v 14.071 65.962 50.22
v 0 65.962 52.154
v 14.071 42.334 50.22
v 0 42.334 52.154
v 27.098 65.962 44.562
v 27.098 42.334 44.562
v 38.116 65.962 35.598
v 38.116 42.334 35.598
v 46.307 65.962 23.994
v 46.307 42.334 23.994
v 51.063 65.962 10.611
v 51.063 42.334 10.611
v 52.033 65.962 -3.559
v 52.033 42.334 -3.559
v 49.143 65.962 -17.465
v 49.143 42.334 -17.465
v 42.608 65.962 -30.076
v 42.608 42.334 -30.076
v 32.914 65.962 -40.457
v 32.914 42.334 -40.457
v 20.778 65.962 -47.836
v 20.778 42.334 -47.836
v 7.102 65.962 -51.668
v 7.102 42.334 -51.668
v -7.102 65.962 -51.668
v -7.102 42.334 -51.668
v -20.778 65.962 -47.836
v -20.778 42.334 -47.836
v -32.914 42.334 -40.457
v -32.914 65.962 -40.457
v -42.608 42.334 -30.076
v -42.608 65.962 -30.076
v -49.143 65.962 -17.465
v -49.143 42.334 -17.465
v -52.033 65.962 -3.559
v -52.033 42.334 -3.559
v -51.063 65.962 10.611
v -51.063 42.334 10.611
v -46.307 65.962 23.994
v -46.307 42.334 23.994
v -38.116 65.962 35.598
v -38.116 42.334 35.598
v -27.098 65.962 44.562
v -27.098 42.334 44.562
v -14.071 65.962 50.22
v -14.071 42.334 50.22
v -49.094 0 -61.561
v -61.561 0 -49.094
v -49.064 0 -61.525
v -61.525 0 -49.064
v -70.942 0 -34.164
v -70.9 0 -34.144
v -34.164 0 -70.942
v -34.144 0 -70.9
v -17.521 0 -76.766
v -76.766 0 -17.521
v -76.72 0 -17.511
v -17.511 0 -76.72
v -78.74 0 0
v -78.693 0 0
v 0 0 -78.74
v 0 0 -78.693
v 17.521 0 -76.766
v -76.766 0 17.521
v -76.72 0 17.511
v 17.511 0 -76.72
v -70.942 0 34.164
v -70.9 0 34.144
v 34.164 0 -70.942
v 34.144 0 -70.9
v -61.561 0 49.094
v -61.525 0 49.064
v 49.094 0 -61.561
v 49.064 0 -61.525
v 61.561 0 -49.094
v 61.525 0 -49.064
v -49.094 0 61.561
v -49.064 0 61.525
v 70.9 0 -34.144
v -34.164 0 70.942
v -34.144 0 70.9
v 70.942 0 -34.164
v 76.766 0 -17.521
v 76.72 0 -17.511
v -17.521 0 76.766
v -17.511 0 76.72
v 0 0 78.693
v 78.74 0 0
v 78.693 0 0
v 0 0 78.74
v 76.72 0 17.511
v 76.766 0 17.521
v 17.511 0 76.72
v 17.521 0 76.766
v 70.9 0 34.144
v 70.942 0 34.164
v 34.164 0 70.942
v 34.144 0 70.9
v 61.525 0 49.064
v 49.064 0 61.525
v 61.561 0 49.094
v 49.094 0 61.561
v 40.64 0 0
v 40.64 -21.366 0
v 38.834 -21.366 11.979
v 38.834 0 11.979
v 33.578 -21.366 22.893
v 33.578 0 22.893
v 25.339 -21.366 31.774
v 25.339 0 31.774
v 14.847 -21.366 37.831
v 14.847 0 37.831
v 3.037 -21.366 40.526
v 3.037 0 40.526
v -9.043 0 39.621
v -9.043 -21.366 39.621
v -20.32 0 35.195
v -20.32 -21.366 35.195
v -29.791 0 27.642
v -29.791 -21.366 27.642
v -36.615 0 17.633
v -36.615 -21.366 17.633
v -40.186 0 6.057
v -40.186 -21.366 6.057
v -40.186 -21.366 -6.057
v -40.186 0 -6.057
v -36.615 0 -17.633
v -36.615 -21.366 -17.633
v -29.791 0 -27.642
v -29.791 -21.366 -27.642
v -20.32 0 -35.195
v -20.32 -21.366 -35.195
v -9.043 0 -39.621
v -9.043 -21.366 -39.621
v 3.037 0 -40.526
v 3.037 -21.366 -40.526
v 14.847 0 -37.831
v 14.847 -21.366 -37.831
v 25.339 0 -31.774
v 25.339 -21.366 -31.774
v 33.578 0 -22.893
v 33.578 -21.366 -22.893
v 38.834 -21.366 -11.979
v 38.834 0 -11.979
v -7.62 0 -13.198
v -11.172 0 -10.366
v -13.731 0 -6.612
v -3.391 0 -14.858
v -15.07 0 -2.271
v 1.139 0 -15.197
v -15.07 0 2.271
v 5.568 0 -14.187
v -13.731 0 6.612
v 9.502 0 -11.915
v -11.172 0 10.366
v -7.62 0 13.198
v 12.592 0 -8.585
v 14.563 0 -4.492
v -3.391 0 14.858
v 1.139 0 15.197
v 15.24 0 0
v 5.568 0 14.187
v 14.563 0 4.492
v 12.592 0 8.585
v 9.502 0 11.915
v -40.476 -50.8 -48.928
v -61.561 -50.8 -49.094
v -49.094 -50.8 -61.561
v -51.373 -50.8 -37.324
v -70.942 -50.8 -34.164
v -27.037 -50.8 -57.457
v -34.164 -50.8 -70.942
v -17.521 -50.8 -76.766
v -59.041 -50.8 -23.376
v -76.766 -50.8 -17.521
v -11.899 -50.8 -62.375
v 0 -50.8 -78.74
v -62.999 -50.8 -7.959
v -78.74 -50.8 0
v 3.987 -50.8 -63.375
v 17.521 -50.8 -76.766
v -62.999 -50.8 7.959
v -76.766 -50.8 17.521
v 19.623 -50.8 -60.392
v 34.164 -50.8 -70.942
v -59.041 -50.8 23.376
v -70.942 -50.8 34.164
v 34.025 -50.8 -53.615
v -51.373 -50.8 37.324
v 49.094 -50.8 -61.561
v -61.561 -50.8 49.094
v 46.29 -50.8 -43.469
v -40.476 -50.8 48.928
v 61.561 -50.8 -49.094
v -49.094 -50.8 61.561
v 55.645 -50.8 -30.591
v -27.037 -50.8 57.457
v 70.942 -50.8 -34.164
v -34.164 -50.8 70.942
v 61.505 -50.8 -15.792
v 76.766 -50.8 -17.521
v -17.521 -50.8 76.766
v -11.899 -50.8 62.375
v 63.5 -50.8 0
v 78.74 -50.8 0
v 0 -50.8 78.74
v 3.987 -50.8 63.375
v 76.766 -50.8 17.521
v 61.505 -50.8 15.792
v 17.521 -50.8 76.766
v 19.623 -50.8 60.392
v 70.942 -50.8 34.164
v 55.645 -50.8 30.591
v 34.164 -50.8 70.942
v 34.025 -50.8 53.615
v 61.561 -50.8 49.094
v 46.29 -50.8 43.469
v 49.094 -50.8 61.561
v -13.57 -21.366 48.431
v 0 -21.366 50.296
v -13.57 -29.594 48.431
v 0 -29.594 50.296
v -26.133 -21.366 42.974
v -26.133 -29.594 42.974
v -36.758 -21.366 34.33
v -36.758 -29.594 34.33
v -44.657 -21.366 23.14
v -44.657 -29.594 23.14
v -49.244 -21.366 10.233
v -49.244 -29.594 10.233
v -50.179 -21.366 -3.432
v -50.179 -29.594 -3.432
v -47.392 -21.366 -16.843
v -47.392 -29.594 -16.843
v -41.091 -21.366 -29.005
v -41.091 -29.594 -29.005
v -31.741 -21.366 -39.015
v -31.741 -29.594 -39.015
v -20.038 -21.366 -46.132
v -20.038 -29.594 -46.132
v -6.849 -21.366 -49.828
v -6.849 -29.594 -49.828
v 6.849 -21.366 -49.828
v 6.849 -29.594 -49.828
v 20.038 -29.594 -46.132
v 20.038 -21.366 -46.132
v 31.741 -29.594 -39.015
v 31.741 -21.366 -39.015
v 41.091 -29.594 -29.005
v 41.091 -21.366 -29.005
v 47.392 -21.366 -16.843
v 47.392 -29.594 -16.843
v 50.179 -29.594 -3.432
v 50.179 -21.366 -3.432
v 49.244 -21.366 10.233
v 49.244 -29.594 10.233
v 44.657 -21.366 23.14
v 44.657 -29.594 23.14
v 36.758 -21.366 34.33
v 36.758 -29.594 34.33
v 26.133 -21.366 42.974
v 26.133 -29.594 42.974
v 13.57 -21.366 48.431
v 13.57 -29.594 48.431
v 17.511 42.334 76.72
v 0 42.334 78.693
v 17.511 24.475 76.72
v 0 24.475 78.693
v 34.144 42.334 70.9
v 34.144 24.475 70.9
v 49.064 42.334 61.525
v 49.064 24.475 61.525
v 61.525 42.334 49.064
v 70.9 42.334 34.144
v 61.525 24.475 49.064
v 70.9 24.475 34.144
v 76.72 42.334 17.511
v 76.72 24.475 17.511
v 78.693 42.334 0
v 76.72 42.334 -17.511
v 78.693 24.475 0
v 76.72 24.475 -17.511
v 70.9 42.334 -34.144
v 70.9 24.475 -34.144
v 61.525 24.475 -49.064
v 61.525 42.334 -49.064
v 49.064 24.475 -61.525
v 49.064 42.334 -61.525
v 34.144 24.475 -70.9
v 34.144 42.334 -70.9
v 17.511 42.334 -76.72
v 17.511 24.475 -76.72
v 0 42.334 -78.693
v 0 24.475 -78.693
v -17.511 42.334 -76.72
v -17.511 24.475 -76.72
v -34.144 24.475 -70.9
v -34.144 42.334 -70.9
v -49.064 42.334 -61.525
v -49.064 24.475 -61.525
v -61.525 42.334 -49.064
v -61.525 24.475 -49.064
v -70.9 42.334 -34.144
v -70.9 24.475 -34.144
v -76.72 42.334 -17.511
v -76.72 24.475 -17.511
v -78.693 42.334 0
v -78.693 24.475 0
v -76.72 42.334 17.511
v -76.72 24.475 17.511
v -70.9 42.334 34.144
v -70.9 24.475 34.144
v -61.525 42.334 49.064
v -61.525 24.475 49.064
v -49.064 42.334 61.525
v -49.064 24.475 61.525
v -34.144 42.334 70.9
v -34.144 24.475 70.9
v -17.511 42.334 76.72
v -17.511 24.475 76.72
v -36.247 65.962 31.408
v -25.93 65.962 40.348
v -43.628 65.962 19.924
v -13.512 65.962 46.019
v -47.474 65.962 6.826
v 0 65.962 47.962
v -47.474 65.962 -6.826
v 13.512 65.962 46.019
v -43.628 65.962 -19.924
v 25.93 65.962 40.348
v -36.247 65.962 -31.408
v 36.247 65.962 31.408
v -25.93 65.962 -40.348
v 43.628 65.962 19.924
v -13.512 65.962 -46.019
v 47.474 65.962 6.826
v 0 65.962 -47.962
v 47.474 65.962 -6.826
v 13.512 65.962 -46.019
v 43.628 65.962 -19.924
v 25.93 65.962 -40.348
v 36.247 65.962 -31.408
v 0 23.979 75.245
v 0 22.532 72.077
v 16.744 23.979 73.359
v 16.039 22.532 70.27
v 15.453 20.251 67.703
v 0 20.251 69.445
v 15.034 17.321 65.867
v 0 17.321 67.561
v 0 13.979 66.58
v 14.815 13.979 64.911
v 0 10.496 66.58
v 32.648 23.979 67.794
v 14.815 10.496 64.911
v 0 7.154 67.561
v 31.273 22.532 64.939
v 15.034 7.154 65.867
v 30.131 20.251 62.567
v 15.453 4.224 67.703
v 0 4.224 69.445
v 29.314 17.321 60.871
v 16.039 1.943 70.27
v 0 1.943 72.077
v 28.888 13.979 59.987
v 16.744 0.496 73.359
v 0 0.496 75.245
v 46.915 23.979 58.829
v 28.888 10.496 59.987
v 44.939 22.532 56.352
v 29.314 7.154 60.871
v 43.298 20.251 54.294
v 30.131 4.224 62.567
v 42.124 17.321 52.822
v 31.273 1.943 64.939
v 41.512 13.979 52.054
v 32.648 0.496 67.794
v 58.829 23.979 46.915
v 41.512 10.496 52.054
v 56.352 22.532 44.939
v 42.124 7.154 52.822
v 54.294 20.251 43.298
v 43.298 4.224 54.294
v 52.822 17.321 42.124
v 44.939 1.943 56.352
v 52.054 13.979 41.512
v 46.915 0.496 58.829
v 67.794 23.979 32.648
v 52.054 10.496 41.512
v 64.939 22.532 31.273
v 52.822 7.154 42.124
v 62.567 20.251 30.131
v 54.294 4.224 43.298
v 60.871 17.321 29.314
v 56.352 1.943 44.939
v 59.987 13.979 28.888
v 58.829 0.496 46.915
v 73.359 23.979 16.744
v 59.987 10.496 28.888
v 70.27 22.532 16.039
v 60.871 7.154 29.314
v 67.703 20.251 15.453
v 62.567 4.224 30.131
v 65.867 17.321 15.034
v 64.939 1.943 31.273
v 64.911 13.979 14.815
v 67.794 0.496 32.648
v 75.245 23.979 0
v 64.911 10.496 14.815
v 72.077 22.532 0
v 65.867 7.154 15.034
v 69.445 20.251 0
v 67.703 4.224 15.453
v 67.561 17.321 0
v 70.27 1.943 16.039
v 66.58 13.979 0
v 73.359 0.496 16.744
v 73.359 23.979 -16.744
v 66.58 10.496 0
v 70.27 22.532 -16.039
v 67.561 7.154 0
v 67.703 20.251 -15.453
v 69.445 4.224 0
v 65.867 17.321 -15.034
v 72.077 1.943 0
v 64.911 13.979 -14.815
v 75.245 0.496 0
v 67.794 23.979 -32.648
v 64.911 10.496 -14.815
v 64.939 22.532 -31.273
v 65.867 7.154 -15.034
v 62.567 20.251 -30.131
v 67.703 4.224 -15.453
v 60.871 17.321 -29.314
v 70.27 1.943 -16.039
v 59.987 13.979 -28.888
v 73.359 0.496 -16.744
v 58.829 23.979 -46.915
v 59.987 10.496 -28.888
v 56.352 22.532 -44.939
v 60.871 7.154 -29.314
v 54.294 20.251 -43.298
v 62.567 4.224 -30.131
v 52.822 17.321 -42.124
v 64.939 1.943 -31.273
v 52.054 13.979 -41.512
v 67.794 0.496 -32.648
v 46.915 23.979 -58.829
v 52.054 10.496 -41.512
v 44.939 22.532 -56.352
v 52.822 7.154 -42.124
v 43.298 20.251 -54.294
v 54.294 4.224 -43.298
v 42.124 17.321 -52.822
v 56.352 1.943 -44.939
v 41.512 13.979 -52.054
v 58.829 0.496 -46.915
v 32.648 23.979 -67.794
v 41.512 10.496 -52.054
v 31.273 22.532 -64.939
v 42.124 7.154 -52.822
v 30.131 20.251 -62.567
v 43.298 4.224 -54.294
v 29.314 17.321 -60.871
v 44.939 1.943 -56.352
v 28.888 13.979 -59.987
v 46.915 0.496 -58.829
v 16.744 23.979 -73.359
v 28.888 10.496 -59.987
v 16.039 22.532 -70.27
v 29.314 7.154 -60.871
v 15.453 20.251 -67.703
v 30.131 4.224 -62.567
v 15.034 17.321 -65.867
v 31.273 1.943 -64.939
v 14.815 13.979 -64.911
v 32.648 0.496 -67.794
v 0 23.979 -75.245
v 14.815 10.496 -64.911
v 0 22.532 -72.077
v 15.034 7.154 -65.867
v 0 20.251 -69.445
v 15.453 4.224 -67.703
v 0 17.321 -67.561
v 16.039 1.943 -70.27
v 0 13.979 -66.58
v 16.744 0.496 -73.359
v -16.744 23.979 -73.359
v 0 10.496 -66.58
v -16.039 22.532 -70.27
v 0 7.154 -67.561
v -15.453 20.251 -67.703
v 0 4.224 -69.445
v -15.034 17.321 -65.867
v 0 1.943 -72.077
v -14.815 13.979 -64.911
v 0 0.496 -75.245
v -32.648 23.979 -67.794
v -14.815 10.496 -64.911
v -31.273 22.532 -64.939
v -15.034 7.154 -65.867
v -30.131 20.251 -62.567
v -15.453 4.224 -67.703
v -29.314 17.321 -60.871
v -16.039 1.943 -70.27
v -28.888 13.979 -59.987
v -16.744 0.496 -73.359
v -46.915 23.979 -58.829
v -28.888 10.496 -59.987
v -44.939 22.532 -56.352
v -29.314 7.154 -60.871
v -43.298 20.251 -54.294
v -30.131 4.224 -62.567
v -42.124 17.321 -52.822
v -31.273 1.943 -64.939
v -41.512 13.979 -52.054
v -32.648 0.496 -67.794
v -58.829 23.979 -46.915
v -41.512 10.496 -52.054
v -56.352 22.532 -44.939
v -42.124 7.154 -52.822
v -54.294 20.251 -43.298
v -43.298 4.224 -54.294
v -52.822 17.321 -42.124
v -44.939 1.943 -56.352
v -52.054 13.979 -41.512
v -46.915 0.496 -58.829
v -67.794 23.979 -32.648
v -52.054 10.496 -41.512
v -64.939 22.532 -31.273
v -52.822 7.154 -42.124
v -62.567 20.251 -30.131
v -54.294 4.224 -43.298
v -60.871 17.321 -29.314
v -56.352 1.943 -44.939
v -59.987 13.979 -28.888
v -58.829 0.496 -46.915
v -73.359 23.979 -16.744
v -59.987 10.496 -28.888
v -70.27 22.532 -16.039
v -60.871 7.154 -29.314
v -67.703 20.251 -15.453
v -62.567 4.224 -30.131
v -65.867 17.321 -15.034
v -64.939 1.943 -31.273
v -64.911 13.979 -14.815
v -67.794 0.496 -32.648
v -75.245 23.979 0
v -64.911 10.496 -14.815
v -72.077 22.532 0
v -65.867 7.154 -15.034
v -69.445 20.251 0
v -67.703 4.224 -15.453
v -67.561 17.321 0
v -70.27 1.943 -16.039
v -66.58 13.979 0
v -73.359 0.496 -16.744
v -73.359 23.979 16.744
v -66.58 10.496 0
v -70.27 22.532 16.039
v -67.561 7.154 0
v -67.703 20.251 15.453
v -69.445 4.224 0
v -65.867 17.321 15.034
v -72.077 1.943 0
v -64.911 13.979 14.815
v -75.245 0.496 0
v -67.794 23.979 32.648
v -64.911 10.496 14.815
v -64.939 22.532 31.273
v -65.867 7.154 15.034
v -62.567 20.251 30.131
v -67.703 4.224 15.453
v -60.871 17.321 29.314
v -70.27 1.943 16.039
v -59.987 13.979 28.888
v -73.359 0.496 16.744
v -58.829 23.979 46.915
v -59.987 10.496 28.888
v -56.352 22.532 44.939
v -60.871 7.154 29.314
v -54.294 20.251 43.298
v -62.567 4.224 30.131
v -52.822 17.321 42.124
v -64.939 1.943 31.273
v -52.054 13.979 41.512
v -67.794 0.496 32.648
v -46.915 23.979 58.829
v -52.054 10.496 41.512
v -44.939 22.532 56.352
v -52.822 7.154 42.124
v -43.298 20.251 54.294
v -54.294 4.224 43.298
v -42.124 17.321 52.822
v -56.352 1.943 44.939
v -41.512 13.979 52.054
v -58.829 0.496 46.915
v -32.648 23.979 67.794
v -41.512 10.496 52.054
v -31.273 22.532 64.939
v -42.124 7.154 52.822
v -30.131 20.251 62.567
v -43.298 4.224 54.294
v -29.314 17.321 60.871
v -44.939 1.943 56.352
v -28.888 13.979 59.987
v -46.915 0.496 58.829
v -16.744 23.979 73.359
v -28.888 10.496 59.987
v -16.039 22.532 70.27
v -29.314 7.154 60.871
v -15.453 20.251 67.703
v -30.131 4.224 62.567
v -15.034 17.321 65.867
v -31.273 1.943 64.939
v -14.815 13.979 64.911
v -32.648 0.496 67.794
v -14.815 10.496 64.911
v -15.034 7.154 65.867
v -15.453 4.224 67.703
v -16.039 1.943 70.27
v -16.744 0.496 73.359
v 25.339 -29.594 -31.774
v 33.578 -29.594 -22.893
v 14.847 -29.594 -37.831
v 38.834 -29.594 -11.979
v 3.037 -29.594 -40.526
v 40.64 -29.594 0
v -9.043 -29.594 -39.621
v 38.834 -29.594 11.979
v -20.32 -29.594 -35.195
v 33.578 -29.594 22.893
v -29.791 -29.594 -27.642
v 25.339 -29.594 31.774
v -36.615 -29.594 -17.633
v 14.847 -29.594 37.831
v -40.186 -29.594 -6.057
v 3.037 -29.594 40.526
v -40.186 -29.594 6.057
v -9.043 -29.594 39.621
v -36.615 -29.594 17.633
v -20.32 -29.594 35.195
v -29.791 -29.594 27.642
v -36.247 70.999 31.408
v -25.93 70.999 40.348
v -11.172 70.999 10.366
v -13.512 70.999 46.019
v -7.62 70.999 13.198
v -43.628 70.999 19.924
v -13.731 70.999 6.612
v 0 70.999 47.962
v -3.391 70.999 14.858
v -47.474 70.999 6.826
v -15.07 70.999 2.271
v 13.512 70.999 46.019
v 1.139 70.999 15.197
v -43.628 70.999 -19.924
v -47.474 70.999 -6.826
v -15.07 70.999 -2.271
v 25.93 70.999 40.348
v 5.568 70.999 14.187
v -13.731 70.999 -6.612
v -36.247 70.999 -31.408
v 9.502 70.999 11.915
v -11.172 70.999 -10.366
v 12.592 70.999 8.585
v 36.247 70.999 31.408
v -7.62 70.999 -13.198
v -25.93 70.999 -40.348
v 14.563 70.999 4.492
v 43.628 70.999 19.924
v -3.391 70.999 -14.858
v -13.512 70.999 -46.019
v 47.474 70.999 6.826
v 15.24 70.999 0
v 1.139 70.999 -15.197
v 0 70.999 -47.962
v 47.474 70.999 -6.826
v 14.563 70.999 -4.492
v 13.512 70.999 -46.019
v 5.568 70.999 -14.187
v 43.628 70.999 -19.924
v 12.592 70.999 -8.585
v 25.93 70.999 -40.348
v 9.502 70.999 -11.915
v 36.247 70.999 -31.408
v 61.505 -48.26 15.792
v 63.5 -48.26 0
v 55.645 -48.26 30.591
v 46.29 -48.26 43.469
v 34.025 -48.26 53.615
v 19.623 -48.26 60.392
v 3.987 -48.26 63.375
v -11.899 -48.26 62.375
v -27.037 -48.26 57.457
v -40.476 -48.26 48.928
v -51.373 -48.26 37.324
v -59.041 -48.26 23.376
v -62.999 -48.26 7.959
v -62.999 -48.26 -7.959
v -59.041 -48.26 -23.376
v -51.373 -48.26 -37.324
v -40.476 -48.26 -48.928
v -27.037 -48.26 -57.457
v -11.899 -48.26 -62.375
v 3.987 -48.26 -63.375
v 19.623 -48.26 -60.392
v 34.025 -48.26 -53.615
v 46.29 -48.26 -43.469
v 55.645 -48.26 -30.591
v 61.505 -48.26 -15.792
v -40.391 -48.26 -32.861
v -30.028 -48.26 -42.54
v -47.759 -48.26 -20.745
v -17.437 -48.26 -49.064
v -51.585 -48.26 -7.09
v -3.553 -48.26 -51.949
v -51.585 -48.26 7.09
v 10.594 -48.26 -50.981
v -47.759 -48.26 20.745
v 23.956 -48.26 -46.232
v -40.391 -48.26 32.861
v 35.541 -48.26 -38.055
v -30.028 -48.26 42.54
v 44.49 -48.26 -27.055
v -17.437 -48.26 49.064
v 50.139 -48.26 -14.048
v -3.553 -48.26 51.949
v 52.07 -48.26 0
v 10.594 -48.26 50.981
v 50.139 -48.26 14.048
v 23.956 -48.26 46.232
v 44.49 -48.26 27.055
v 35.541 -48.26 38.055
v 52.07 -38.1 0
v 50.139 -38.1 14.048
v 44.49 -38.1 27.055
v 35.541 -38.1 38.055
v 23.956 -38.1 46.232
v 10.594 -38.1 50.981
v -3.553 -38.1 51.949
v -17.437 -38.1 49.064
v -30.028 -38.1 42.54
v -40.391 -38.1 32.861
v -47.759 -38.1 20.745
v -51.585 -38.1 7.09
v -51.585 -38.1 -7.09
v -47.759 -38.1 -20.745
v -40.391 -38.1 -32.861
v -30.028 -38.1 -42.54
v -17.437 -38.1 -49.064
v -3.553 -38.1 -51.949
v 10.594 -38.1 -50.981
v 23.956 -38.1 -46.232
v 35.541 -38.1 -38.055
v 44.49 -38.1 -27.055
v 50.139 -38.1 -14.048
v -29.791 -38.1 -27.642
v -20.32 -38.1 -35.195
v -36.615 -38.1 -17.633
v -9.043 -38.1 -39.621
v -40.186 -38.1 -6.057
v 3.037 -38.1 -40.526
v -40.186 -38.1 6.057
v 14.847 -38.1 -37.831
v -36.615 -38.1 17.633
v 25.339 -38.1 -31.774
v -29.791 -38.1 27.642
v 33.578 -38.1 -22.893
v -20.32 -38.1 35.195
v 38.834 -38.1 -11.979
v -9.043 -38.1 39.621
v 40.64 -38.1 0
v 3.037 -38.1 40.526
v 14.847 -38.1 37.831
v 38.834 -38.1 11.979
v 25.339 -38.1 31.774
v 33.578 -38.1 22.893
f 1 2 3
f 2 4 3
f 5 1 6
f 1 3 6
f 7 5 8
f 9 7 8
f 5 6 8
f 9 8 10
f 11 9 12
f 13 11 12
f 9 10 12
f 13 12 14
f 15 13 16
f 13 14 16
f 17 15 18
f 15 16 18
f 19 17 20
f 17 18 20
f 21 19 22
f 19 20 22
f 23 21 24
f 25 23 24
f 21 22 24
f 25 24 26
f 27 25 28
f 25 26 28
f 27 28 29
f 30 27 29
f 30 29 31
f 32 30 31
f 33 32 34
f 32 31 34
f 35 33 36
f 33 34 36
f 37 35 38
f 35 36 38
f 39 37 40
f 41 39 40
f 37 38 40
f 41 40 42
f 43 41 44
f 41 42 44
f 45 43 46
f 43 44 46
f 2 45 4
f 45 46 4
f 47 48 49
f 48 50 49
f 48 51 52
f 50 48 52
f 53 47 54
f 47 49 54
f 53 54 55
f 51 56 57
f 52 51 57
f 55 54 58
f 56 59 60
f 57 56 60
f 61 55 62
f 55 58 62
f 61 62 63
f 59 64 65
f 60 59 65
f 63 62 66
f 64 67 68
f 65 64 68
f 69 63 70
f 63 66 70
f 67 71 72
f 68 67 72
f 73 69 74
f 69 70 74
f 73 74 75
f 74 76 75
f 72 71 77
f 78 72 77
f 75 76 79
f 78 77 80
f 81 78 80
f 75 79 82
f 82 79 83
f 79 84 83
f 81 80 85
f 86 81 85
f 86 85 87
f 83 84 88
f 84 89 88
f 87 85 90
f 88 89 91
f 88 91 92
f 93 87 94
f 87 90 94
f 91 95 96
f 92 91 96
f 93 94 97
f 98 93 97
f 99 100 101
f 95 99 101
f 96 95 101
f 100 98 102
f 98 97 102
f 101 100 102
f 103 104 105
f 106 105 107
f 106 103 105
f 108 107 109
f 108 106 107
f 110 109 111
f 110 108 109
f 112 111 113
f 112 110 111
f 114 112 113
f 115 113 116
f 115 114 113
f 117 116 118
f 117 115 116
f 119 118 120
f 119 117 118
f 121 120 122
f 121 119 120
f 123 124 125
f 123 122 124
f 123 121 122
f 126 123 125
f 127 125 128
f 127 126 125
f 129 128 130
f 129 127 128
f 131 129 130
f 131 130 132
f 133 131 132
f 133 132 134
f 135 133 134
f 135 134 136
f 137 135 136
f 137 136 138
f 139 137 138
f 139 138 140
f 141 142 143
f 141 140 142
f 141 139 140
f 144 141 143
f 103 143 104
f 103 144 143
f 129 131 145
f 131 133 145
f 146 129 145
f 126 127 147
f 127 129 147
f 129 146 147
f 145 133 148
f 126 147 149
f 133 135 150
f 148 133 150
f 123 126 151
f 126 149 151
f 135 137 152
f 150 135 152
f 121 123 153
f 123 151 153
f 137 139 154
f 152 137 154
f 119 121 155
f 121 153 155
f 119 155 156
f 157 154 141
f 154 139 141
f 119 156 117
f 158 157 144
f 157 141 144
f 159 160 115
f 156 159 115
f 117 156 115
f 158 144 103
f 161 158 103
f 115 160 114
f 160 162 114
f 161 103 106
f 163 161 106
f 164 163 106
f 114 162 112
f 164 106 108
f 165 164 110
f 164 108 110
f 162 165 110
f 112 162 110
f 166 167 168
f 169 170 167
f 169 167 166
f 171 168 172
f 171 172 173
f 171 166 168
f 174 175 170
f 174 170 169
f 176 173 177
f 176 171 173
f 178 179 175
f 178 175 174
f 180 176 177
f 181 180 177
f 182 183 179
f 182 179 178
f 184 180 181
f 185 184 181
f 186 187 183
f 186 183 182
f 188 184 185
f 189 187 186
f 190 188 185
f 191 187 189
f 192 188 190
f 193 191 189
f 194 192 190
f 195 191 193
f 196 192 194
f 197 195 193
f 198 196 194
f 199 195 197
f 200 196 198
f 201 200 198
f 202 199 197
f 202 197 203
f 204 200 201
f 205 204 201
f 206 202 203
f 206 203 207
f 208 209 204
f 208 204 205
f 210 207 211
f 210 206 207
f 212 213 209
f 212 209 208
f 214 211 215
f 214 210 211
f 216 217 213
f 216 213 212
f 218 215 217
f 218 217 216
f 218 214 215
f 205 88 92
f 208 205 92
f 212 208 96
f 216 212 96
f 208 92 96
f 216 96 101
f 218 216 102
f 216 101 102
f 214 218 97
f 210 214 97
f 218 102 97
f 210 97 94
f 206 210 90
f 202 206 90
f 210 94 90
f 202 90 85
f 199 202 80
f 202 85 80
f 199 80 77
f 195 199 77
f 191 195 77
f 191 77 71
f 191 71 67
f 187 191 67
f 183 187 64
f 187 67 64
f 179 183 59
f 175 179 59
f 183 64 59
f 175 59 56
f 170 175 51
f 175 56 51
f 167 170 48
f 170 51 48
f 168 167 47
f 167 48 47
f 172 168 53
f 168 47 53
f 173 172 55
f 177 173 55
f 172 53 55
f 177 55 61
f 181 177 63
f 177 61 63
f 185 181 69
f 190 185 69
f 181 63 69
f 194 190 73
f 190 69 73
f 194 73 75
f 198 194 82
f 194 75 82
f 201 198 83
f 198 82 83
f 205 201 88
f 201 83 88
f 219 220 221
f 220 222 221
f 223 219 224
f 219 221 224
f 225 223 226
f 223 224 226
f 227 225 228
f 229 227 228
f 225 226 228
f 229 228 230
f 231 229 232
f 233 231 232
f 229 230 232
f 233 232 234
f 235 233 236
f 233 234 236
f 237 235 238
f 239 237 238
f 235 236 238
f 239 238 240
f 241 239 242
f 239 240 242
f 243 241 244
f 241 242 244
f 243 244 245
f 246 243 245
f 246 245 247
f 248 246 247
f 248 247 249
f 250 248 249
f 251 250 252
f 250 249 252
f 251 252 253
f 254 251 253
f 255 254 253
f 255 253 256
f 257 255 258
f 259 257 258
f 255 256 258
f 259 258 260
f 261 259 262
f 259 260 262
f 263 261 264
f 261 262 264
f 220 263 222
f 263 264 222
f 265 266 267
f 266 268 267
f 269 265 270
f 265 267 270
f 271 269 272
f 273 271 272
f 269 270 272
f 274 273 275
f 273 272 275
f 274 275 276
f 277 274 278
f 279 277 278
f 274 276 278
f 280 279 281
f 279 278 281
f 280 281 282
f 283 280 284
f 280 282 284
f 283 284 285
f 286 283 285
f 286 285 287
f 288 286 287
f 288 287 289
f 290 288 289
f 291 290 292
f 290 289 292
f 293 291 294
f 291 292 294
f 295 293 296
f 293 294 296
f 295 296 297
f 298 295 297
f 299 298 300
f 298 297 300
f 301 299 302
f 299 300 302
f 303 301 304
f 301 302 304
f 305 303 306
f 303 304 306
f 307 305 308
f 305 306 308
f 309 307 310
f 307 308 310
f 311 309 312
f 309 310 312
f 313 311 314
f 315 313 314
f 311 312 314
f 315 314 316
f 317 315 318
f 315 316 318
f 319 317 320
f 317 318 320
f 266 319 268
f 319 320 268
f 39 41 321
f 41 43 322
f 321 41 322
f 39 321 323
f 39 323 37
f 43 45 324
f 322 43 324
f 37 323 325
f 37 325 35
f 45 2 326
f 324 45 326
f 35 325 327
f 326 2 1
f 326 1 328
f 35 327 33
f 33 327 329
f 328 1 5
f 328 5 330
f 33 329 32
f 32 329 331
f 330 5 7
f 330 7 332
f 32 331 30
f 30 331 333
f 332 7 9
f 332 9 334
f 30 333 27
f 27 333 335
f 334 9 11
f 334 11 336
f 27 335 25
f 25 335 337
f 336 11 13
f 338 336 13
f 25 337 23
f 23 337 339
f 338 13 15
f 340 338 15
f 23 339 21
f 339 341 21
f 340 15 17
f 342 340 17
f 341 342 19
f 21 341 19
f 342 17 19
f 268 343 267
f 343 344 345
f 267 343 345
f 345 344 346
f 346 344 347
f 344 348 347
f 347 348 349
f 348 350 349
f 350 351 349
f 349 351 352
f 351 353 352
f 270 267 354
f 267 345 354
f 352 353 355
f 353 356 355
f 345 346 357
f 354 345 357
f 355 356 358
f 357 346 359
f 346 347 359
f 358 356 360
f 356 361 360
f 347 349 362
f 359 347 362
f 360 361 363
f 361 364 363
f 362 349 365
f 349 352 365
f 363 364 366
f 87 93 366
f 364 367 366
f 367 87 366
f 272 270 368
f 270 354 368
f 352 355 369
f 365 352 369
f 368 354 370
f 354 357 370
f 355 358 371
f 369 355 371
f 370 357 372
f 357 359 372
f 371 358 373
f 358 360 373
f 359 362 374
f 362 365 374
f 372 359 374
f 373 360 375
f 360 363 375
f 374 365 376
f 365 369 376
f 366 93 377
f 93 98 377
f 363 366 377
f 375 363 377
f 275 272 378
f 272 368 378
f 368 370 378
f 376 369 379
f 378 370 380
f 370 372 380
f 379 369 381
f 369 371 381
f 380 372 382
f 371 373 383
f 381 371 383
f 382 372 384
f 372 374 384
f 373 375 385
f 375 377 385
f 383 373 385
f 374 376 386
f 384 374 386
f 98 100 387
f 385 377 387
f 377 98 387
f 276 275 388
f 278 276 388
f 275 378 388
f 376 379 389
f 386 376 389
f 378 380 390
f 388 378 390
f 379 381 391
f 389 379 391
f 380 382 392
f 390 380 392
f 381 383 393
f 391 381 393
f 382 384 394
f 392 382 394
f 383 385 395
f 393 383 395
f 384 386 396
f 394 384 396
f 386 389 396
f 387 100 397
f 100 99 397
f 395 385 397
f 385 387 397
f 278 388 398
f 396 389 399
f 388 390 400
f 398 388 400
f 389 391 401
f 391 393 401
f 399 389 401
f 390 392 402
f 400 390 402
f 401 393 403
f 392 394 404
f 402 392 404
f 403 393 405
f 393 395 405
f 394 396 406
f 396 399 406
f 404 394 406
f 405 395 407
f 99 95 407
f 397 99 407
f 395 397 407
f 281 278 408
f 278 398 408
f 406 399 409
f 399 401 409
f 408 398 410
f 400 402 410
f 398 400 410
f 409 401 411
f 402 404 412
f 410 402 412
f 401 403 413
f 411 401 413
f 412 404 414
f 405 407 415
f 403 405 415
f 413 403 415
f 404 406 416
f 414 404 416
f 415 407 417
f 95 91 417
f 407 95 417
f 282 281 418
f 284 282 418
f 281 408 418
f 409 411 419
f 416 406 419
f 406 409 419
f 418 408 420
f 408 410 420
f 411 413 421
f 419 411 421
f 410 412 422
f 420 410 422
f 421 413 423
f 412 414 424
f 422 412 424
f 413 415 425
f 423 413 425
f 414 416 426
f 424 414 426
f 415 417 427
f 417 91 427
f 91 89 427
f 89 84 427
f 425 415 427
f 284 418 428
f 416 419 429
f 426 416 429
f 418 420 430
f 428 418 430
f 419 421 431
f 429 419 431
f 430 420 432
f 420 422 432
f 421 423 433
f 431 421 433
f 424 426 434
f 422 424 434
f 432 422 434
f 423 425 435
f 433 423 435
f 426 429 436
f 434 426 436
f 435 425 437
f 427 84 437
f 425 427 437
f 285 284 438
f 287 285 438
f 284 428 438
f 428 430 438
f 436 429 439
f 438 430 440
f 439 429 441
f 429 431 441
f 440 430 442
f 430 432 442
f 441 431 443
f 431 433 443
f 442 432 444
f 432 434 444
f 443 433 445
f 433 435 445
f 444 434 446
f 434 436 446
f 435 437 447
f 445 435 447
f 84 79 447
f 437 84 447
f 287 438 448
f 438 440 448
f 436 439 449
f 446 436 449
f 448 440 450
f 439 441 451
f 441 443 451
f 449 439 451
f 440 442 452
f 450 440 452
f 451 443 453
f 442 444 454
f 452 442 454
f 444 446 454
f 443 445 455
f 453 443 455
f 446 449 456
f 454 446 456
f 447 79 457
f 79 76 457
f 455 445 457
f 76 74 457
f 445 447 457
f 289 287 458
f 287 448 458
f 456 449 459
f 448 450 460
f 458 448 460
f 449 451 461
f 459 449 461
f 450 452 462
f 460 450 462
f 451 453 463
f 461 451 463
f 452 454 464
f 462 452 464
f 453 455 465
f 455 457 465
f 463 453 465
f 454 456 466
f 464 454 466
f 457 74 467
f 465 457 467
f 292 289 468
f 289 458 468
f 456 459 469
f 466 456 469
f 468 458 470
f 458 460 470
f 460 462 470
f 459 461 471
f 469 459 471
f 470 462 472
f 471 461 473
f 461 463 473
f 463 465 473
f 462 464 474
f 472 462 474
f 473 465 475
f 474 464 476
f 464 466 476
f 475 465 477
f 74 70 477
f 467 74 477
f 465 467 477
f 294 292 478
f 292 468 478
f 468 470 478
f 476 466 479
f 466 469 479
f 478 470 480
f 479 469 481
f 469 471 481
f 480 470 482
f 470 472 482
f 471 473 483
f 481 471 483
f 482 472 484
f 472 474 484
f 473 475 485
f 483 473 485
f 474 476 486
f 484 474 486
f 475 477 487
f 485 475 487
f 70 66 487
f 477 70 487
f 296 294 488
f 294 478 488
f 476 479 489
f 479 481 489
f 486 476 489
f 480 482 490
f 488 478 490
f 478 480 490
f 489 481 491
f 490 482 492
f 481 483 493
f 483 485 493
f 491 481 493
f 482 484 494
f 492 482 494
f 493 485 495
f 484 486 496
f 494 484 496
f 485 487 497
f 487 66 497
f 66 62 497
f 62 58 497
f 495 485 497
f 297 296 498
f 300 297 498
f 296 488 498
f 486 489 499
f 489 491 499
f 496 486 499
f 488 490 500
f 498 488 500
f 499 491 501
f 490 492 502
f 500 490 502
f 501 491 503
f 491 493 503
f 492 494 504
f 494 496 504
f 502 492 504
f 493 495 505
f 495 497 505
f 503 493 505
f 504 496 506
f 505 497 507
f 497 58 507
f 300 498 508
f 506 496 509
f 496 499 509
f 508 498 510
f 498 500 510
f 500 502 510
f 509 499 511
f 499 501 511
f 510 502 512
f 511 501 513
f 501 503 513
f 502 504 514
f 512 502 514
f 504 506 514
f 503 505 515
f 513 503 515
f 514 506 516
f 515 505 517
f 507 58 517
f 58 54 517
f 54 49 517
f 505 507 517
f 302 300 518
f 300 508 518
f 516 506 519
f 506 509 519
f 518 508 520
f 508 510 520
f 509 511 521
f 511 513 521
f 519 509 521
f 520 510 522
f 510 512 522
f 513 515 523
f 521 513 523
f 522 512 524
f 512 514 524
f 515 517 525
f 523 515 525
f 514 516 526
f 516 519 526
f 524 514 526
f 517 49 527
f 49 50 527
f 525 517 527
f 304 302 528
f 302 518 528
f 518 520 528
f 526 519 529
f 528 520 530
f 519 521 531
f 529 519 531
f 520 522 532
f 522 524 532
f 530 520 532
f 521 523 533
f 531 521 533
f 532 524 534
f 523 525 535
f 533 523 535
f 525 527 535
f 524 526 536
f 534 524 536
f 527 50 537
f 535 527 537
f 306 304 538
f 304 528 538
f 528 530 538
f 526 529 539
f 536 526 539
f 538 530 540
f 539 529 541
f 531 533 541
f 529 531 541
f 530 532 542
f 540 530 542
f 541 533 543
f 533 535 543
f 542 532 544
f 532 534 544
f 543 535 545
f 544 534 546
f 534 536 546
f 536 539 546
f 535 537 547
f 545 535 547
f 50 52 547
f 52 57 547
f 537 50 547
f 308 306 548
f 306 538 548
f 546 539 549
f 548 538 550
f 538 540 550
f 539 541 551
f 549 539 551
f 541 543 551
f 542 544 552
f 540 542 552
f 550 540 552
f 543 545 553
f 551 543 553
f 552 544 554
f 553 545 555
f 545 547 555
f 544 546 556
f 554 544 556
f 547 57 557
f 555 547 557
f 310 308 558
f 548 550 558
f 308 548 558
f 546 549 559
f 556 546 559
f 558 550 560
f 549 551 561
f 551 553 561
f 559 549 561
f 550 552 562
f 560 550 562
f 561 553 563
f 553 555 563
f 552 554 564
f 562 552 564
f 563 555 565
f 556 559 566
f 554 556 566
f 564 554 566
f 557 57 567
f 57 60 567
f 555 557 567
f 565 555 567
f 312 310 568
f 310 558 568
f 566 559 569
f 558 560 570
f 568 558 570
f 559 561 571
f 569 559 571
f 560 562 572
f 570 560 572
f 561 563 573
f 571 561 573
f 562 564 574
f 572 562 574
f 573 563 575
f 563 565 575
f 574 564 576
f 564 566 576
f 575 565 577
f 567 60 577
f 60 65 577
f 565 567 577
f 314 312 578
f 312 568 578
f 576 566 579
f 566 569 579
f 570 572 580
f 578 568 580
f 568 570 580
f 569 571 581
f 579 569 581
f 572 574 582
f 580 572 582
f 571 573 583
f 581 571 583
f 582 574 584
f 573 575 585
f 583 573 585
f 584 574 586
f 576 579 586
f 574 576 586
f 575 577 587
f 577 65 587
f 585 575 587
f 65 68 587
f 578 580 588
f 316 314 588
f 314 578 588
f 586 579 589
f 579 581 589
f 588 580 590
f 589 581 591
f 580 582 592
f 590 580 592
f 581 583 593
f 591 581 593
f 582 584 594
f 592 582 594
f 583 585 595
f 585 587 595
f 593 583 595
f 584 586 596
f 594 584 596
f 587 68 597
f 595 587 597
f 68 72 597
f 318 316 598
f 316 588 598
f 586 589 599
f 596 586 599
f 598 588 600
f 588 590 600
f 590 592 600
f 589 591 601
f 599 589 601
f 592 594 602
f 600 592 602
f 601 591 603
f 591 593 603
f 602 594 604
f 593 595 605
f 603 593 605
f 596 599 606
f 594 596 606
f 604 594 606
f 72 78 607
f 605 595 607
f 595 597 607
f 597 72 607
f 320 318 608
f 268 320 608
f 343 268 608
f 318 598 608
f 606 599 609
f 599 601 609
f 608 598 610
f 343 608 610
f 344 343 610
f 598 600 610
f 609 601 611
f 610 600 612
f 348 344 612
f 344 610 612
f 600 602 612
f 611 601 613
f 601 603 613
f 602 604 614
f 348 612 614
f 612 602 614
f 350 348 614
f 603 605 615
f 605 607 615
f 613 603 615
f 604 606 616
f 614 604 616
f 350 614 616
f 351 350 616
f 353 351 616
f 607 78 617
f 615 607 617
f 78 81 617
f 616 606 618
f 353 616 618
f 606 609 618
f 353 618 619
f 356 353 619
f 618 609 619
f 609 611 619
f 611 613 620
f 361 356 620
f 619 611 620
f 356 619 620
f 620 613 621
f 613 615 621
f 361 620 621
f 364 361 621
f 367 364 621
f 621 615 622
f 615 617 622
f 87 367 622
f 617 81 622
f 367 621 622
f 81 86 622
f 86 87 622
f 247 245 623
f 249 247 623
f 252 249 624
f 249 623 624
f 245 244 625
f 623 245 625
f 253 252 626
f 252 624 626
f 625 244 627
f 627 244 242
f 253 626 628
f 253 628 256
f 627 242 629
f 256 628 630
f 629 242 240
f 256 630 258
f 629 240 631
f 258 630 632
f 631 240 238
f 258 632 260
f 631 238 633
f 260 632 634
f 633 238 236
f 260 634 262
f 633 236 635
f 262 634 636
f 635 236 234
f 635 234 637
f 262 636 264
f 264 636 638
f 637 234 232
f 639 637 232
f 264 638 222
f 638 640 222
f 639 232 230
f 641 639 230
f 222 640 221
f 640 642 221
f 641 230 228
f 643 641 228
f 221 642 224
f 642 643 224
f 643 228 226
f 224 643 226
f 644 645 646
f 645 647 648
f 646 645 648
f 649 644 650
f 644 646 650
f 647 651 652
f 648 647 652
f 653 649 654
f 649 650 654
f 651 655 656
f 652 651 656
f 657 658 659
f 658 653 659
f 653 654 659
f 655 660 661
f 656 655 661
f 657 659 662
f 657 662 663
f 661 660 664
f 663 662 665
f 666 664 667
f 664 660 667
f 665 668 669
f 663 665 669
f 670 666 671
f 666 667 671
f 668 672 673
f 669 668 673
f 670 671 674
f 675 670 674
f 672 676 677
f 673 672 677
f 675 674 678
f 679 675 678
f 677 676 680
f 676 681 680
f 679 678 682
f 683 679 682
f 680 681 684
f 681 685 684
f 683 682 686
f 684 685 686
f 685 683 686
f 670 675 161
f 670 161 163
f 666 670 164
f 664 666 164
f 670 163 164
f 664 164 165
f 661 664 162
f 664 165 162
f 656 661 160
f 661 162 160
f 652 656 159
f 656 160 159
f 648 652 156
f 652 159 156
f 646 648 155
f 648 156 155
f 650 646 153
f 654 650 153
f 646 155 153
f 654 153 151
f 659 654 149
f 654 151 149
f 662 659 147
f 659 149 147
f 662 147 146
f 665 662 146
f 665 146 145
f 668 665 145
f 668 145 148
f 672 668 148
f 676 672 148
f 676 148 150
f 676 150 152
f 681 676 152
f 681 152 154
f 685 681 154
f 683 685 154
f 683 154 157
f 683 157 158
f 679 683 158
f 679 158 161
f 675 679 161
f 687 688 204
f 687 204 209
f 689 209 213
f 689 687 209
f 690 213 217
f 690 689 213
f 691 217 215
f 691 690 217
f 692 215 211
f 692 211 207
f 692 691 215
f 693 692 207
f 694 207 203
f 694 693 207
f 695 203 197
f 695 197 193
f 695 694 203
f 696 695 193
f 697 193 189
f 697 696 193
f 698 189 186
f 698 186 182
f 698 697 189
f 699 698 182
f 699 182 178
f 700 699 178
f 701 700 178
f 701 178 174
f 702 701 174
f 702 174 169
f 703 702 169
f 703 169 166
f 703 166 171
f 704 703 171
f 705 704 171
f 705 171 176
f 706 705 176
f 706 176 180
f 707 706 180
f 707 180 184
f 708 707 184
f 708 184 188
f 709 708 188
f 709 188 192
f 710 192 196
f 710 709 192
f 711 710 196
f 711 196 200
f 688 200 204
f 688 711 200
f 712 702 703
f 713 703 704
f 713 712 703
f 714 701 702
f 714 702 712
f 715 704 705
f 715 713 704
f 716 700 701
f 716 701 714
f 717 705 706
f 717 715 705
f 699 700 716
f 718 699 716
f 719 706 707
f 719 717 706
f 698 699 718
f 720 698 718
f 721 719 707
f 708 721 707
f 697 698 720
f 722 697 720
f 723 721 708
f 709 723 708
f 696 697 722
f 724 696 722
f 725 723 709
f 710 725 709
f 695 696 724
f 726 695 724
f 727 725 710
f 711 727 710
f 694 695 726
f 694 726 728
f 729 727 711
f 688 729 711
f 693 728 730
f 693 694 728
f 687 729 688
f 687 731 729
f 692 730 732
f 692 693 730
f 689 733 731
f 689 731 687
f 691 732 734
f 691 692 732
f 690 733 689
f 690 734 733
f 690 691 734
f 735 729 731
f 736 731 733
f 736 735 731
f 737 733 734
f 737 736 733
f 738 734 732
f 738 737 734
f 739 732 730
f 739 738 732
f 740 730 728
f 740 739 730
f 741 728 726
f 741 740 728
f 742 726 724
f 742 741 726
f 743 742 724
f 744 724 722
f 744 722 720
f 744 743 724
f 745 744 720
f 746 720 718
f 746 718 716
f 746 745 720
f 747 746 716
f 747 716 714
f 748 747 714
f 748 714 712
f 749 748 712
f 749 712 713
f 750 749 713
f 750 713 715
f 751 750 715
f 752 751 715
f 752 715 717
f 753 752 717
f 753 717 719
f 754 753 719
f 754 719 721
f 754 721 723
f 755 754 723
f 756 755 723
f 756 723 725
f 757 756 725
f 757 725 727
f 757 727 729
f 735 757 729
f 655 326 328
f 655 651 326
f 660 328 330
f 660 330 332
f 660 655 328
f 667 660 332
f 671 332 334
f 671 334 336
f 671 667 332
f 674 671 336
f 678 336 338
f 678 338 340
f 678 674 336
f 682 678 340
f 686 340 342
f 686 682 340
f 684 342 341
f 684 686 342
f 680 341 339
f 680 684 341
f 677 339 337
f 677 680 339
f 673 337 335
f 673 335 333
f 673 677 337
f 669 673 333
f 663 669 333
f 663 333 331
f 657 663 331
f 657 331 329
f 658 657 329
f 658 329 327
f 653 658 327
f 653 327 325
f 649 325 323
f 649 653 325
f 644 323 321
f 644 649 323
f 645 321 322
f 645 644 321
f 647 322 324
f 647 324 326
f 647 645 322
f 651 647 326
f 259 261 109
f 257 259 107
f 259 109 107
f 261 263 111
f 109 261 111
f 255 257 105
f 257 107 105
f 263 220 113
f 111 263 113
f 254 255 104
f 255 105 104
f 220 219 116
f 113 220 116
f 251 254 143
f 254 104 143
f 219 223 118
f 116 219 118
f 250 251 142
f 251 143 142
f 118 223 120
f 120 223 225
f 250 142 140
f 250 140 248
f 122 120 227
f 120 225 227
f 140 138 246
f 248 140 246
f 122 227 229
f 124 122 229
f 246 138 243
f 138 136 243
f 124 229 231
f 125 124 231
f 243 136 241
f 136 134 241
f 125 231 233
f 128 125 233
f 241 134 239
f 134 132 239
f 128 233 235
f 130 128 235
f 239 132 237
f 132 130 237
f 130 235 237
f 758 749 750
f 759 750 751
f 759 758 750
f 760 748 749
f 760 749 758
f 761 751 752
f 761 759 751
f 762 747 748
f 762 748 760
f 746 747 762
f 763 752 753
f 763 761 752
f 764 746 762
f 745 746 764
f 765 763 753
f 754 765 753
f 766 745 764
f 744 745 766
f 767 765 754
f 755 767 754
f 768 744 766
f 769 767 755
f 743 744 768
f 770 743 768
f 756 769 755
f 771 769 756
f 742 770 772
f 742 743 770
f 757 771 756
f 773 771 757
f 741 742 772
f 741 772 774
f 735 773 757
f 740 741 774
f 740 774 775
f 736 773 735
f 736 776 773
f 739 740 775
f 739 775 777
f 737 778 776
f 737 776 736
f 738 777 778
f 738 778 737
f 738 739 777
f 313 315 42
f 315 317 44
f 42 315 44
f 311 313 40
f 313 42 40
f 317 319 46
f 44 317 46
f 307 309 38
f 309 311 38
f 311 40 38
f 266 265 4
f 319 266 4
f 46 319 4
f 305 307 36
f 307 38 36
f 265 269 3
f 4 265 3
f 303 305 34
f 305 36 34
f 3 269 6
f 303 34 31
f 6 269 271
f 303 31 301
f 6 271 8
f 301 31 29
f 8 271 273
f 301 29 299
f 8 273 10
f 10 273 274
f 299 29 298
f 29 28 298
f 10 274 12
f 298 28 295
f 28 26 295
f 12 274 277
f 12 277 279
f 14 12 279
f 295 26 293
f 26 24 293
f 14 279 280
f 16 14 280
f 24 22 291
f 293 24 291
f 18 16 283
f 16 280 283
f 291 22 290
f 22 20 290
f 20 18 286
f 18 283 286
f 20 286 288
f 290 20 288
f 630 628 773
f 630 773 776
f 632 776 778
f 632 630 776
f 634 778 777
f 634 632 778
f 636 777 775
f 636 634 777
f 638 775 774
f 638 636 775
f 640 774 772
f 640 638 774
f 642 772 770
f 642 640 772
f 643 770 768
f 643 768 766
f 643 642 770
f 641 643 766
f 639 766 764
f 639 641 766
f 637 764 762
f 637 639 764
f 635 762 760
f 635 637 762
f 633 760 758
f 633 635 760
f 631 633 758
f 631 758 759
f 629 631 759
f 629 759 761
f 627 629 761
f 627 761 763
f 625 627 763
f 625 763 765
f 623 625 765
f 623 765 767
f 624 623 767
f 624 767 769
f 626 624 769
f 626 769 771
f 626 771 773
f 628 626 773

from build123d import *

# Parameters (mm, degrees)
F0_R      = 78.74
F0_R_2    = 63.5
F1_DEPTH  = 50.8
F2_R      = 63.5
F2_R_2    = 52.07
F5_DEPTH  = 48.26
F4_R      = 63.5
F4_R_2    = 40.64
F6_DEPTH  = 38.1
F3_W      = 5.037099
F3_H      = 46.096297
F8_W      = 9.554964
F8_H      = 33.442384
F10_R     = 15.24
F11_DEPTH = 70.999706


with BuildPart() as f1:
    # F0 (on Front) → F1 (new body)
    with BuildSketch(Plane.XZ):
        Circle(F0_R)
        Circle(F0_R_2, mode=Mode.SUBTRACT)
    extrude(amount=F1_DEPTH)

    # F2 (on Front) → F5 (join)
    with BuildSketch(Plane.XZ):
        Circle(F2_R)
        Circle(F2_R_2, mode=Mode.SUBTRACT)
    extrude(amount=F5_DEPTH)

    # F4 (on Front) → F6 (join)
    with BuildSketch(Plane.XZ):
        Circle(F4_R)
        Circle(F4_R_2, mode=Mode.SUBTRACT)
    extrude(amount=F6_DEPTH)

    # F3 (on Right) → F7 (revolve)
    with BuildSketch(Plane.YZ):
        Polygon((42.333808, 78.692965), (24.474939, 78.692965), (24.474939, 1.865802), (42.333808, 1.865802), (42.333808, 52.154191), align=None)
        with BuildLine():
            Line((24.474939, 1.865802), (24.474939, 78.692965))
            ThreePointArc((24.474939, 78.692965), (12.23747, 66.455496), (0, 78.692965))
            Line((0, 78.692965), (0, 1.865802))
            Line((0, 1.865802), (24.474939, 1.865802))
        make_face()
        Polygon((65.961607, 52.154191), (42.333808, 52.154191), (42.333808, 1.865802), (65.961607, 1.865802), (65.961607, 47.962099), align=None)
        with Locations((68.480156, 24.91395)):
            Rectangle(F3_W, F3_H)
    revolve(axis=Axis((0, 23.528613, 0), (0, 1, 0)))

    # F8 (on Right) → F9 (revolve, cut)
    with BuildSketch(Plane.YZ):
        Polygon((-29.593855, 39.679654), (-29.593855, 6.23727), (-21.365967, 6.23727), (-21.365967, 50.296281), (-29.593855, 50.296281), align=None)
        with Locations((-34.371337, 22.958462)):
            Rectangle(F8_W, F8_H)
    revolve(axis=Axis((0, -25.413556, 0), (0, -1, 0)), mode=Mode.SUBTRACT)

    # F10 (on Front) → F11 (cut, through all)
    with BuildSketch(Plane.XZ):
        Circle(F10_R)
    extrude(amount=-F11_DEPTH, mode=Mode.SUBTRACT)


solid = f1.part
